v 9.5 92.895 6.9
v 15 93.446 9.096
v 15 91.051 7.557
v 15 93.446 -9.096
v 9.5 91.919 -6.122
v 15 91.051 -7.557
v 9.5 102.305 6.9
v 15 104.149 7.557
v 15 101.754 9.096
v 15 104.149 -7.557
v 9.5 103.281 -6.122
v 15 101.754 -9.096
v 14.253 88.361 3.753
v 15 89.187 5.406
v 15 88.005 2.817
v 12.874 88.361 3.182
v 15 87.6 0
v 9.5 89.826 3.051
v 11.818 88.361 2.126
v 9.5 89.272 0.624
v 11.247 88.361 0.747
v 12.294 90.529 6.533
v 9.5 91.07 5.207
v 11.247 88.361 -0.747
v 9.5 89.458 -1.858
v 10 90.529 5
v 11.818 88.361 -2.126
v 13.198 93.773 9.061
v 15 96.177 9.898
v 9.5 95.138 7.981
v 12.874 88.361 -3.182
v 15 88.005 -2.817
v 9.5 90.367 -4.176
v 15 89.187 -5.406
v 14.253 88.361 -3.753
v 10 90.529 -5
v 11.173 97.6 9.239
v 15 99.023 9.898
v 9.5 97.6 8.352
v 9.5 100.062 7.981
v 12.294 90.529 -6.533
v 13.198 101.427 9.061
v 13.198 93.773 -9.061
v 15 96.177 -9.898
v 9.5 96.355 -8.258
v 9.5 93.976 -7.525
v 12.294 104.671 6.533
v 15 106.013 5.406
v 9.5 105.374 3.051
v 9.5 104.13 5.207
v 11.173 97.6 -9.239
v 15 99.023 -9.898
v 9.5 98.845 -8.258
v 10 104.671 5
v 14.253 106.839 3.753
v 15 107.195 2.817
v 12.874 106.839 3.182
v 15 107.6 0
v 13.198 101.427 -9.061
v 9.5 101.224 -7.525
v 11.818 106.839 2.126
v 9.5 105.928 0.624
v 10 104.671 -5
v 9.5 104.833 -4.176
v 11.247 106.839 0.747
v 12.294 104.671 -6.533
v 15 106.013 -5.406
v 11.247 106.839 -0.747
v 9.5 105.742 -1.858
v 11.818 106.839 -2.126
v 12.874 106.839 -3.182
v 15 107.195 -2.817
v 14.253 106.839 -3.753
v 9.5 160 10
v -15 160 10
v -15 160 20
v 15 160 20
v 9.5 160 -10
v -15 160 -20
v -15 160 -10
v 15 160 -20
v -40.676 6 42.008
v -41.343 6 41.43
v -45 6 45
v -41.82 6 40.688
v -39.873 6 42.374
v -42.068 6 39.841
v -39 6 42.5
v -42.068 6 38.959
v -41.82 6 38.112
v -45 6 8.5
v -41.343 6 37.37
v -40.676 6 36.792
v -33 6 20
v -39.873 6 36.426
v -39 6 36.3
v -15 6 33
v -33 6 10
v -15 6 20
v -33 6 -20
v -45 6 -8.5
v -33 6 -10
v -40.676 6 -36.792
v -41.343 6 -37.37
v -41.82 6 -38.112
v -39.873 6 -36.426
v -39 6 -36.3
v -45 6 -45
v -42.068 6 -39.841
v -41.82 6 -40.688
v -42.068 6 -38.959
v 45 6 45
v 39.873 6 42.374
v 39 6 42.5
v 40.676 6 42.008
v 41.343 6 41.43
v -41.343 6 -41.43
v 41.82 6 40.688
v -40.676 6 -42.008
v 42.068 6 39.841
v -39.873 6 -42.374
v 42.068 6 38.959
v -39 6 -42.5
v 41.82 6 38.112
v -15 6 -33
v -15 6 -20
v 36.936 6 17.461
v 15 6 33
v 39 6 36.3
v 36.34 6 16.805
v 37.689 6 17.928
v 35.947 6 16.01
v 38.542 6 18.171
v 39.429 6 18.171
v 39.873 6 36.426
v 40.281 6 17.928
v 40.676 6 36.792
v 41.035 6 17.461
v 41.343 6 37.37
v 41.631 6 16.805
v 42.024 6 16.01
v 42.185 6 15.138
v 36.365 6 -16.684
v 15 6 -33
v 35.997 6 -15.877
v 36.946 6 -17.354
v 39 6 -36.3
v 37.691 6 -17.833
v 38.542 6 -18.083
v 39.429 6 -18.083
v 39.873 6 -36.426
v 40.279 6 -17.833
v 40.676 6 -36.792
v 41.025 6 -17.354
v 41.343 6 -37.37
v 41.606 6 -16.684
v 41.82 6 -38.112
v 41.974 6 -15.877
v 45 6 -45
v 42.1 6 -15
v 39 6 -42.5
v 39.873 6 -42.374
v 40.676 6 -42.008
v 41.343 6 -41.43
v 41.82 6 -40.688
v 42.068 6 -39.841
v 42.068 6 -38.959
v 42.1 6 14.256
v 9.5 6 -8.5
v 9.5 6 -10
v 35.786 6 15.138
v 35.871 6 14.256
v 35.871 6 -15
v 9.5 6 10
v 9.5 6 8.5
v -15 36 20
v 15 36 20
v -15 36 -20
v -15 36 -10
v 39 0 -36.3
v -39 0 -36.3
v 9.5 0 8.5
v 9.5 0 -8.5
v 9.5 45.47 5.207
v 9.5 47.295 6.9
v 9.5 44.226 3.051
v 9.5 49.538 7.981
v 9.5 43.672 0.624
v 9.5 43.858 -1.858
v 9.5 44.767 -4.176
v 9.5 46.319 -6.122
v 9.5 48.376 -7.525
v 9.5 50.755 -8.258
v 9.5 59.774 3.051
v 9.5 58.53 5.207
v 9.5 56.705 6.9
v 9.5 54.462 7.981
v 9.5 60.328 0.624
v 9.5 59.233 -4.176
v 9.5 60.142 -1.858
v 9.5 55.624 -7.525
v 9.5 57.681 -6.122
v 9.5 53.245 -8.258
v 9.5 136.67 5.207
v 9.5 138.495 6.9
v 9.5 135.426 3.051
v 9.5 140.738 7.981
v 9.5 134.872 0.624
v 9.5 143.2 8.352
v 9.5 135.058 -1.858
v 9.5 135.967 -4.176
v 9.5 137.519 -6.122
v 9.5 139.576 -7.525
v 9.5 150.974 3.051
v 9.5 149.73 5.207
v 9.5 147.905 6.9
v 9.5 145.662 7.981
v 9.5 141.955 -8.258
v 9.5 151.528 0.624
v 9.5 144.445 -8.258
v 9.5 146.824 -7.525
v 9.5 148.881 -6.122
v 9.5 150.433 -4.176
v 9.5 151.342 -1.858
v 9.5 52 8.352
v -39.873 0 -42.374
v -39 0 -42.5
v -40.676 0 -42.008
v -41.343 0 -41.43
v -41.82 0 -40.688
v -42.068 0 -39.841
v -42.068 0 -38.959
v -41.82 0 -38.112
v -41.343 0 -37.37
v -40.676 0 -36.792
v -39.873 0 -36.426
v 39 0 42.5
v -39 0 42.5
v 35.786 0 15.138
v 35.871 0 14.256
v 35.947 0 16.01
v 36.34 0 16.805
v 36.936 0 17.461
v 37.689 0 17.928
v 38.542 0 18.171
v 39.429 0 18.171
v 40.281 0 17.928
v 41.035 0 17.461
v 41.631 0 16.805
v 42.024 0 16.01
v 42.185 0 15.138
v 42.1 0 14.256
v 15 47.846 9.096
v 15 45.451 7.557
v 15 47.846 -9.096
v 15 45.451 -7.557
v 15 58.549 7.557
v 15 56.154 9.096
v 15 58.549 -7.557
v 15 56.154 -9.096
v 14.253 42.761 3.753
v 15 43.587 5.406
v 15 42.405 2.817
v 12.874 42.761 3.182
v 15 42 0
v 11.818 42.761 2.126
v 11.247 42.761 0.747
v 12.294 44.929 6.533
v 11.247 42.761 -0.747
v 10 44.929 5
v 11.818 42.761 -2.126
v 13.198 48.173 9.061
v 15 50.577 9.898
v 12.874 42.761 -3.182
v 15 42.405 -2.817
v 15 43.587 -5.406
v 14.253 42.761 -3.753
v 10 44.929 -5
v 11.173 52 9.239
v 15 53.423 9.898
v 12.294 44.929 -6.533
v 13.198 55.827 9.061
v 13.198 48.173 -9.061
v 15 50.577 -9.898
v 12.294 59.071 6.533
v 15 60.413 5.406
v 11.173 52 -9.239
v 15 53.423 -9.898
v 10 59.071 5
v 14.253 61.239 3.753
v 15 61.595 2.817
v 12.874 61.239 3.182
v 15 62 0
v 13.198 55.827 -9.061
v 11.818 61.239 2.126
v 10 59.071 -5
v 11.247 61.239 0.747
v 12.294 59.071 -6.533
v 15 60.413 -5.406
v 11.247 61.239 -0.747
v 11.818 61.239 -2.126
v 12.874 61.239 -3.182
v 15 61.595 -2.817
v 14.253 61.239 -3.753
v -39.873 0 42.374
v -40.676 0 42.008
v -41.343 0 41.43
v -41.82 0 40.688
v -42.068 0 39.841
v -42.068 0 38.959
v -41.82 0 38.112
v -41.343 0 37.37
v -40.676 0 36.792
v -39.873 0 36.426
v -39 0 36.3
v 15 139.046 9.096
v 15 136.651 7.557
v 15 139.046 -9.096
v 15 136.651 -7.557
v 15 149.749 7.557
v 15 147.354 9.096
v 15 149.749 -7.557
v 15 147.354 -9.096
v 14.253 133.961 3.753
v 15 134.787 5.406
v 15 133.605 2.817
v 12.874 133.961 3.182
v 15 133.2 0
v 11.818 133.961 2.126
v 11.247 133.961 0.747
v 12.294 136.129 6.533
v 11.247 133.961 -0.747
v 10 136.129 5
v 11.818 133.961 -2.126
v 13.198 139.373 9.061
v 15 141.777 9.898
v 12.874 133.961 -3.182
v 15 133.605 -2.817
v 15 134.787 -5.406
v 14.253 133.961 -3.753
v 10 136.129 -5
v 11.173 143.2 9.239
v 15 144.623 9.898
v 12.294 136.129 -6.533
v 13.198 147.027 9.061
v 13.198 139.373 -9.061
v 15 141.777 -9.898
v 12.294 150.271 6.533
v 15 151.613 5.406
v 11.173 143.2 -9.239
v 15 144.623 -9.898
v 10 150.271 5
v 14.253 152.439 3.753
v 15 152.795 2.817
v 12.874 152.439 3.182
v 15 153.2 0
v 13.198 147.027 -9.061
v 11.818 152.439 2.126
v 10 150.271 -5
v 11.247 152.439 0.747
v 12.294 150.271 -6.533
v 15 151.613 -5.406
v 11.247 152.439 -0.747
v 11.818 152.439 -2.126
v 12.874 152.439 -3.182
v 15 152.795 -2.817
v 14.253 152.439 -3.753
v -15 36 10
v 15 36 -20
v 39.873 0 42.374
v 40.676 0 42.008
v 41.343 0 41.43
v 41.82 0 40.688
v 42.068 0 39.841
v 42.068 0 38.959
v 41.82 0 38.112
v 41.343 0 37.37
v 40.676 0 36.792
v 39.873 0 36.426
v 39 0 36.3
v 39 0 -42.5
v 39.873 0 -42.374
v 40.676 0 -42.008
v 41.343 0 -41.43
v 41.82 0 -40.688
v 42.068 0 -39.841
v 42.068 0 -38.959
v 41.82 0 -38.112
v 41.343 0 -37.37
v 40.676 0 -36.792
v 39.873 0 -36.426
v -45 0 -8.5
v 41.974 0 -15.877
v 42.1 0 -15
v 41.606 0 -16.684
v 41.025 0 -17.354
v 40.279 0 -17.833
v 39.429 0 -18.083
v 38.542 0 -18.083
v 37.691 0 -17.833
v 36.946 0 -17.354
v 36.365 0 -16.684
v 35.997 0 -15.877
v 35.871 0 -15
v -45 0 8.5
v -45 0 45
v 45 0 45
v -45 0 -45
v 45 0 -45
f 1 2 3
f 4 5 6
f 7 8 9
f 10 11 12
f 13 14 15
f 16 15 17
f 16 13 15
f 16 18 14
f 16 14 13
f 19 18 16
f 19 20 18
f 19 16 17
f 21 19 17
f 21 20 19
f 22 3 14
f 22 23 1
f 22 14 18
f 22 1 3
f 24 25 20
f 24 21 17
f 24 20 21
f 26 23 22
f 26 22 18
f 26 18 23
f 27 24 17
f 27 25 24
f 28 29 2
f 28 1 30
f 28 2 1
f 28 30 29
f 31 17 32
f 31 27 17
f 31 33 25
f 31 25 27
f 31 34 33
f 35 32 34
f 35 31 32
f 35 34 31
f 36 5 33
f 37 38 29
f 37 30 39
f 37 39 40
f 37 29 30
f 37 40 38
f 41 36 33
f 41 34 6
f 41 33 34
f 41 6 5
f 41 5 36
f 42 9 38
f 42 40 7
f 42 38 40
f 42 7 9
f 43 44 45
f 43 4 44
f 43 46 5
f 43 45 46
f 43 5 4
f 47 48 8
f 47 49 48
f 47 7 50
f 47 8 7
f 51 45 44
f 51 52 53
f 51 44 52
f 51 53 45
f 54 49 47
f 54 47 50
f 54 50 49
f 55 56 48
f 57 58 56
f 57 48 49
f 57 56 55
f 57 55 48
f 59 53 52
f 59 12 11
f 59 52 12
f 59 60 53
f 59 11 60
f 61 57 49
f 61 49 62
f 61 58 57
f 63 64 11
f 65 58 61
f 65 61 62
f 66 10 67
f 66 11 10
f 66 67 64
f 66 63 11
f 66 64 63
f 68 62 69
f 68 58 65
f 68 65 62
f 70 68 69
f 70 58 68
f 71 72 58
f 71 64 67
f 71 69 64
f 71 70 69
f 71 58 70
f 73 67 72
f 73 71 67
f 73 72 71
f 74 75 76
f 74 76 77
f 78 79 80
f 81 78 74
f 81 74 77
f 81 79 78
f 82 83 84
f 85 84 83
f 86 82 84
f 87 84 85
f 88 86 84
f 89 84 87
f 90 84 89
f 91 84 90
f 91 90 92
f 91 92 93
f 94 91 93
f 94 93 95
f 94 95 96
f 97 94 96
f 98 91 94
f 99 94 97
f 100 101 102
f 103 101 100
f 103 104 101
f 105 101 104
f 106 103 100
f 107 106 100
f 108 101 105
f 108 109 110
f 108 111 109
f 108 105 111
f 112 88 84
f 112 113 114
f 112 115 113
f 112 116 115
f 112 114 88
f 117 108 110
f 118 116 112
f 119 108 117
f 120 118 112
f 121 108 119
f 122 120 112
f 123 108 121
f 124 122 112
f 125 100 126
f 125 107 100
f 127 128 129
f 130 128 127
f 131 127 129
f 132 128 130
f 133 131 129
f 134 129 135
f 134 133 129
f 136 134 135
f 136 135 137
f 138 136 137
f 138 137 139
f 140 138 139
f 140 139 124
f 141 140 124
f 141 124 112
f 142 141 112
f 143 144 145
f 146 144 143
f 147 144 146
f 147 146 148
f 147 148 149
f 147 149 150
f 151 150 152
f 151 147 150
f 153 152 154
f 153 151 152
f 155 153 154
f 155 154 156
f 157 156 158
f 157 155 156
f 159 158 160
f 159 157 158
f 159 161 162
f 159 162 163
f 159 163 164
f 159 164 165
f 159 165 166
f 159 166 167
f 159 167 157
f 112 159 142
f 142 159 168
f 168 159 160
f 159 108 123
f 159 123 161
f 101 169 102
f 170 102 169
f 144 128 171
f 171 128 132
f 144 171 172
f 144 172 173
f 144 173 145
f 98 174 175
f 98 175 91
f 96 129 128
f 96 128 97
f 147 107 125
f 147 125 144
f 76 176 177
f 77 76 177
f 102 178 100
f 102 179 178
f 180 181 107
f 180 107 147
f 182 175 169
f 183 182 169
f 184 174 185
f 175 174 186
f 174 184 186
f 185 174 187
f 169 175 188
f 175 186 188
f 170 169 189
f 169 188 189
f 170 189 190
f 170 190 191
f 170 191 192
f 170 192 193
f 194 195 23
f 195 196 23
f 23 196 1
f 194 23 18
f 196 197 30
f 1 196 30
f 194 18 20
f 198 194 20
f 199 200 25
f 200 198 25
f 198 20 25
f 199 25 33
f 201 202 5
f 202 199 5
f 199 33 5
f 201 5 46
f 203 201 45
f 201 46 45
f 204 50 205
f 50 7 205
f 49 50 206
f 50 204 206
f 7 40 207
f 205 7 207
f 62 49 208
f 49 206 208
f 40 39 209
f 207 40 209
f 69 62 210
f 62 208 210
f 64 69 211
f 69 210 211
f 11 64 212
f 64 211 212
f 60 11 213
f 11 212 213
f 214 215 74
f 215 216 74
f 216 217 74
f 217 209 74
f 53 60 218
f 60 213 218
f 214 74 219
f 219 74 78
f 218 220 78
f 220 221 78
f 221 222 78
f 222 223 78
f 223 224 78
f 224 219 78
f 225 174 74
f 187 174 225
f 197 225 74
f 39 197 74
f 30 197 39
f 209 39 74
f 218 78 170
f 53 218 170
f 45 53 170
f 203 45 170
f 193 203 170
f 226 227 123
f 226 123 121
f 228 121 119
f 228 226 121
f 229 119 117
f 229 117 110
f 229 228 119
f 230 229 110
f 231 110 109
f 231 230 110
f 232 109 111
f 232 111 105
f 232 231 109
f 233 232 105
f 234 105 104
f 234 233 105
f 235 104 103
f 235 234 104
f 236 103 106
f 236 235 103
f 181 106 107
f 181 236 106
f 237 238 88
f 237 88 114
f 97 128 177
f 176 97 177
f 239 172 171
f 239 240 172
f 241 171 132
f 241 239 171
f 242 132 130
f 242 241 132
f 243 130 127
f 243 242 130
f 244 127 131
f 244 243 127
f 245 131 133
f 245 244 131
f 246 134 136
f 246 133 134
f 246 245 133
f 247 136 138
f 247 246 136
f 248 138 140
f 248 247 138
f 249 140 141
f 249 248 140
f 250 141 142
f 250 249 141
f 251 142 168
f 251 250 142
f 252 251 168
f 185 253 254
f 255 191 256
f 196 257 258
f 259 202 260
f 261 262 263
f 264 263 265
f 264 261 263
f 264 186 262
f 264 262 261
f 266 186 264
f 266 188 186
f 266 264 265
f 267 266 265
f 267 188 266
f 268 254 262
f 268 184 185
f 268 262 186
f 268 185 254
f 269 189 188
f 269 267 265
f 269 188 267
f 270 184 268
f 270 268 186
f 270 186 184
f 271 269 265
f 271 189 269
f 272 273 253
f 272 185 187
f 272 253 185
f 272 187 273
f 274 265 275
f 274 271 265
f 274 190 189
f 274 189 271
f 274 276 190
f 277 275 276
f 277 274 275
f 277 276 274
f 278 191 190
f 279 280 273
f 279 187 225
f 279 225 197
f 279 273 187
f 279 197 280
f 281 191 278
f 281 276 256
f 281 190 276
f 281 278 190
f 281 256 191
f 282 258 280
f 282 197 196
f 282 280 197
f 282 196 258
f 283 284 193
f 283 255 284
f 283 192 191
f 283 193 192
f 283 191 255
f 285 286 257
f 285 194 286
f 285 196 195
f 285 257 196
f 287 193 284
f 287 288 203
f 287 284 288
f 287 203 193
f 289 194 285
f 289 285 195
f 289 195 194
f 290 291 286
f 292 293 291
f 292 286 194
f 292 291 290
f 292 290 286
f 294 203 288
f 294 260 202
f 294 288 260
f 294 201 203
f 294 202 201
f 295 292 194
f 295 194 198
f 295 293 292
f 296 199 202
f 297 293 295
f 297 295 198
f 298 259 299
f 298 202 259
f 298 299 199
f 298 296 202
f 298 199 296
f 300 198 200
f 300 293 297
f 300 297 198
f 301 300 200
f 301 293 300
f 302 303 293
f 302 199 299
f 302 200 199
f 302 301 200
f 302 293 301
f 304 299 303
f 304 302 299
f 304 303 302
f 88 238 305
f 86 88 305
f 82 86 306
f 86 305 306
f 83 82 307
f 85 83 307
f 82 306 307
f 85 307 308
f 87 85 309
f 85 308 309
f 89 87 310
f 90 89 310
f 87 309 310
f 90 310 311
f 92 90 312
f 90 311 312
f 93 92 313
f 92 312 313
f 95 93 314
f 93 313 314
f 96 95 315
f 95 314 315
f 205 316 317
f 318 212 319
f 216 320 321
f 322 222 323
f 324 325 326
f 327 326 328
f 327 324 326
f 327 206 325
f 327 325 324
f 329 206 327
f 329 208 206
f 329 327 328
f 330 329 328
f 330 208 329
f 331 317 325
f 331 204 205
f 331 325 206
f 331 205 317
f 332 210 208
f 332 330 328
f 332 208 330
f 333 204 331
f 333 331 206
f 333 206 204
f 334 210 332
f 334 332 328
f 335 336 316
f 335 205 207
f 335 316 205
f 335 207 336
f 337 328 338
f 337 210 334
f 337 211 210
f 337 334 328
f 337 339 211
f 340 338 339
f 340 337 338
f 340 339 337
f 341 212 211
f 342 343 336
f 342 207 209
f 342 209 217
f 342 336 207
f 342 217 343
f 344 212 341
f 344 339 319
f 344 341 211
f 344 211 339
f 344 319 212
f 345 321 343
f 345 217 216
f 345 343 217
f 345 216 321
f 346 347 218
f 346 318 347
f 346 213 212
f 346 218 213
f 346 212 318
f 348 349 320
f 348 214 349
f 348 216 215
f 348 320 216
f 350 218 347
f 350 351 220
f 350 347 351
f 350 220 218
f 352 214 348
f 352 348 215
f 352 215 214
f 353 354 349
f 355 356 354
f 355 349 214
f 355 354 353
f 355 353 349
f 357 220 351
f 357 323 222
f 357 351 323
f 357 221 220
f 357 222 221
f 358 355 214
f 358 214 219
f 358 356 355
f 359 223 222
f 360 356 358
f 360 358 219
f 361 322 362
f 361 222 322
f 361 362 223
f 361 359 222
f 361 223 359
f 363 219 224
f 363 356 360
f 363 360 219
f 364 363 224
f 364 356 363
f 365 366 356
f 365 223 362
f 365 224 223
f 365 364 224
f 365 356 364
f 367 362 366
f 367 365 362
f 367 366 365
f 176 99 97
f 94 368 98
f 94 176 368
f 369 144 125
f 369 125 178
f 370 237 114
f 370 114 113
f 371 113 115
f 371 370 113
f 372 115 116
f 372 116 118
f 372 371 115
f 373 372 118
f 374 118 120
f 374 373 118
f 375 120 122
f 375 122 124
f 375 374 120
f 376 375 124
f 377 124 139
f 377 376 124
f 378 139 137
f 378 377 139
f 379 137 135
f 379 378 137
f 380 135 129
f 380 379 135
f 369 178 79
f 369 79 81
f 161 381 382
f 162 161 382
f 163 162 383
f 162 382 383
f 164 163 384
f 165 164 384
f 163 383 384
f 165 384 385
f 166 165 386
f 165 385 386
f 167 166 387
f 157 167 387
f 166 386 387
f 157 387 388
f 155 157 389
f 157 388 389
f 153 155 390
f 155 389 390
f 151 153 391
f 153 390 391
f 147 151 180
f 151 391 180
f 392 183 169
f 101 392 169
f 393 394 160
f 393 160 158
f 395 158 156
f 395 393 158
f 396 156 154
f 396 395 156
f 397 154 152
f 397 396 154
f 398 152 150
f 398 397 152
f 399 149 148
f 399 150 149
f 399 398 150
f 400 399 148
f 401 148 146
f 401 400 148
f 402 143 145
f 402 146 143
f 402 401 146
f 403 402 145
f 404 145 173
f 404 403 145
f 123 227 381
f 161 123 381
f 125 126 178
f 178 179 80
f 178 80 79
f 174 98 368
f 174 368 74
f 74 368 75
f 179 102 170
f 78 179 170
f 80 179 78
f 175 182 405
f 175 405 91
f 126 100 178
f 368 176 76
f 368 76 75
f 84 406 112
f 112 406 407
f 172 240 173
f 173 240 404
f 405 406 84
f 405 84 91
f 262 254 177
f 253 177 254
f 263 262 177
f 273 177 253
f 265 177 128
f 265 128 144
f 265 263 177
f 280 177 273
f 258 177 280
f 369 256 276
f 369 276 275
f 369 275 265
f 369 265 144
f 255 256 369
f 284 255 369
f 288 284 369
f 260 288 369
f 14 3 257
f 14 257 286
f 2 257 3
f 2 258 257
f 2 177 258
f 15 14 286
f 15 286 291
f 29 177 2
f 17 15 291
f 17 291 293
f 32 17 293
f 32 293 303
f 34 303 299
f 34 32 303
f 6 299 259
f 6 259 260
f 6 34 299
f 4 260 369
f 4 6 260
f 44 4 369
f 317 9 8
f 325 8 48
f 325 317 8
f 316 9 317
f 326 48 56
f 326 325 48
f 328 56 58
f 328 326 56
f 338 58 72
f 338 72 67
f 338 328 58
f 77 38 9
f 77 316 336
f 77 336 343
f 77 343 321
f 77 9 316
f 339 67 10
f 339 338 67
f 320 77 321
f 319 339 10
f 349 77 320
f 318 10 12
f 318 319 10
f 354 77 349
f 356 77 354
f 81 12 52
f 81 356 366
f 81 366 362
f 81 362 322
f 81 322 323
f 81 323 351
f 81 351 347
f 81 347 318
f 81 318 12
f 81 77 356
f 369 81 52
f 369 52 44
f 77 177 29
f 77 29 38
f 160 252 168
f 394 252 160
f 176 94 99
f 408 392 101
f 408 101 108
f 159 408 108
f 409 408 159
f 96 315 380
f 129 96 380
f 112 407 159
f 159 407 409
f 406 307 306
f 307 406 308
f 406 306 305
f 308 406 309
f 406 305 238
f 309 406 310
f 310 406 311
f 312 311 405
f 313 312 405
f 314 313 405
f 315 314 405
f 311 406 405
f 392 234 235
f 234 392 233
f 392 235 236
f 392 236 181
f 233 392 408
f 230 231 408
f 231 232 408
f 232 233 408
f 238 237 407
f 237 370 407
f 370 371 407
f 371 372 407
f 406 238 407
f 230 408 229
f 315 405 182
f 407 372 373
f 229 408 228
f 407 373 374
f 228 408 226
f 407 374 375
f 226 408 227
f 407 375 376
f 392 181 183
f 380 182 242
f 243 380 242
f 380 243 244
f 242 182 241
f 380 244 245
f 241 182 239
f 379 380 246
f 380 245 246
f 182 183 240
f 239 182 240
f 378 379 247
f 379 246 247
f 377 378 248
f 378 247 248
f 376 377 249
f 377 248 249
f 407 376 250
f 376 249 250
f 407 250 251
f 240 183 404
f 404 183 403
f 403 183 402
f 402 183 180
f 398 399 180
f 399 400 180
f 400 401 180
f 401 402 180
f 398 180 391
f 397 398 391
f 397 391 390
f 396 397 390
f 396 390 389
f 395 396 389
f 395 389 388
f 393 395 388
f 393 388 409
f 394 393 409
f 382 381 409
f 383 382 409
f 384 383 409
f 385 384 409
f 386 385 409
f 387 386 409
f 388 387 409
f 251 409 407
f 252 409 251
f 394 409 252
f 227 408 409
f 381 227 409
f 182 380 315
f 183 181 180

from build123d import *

# Parameters (mm, degrees)
SKETCH_1_W                  = 90
SKETCH_1_H                  = 90
EXTRUDE_1_DEPTH             = 6
SKETCH_2_W                  = 30
SKETCH_2_H                  = 40
EXTRUDE_2_DEPTH             = 160
EXTRUDE_3_REACH             = 174.192
EXTRUDE_3_DIRECTION_2_REACH = 174.192
SKETCH_8_R                  = 3.1
CUT_EXTRUDE_2_DEPTH         = 6
PATTERN_LINEAR_1_COUNT      = 3
PATTERN_LINEAR_1_PITCH      = 45.6
EXTRUDE_4_DEPTH             = 15
CUT_EXTRUDE_4_DEPTH         = 9.5
CUT_EXTRUDE_4_DEPTH_BACK    = 173.191753577
SKETCH_17_W                 = 20
SKETCH_17_H                 = 154
CUT_EXTRUDE_8_DEPTH         = 9.5
CUT_EXTRUDE_8_DEPTH_BACK    = 173.191753577
SKETCH_21_W                 = 17
SKETCH_21_H                 = 6
SKETCH_23_W                 = 78
SKETCH_23_H                 = 6.2
CUT_EXTRUDE_9_DEPTH         = 173.191753577
MIRROR_14_COPY_1_SKETCH_R   = 3.1
MIRROR_14_COPY_1_DEPTH      = 6
SKETCH_25_W                 = 6.229282002
SKETCH_25_H                 = 30
CUT_EXTRUDE_10_DEPTH        = 173.191753577
SKETCH_26_R                 = 3.114641001
CUT_EXTRUDE_11_DEPTH        = 173.191753577
SKETCH_27_R                 = 3.202321727
CUT_EXTRUDE_12_DEPTH        = 173.191753577


with BuildPart() as part:
    # 草图1 → 凸台-拉伸1 (new body)
    with BuildSketch(Plane(origin=(0, 0, 0), x_dir=(1, 0, 0), z_dir=(0, 1, 0))):
        Rectangle(SKETCH_1_W, SKETCH_1_H)
    extrude(amount=EXTRUDE_1_DEPTH)

    # 草图2 → 凸台-拉伸2 (add)
    with BuildSketch(Plane(origin=(0, 0, 0), x_dir=(1, 0, 0), z_dir=(0, 1, 0))):
        Rectangle(SKETCH_2_W, SKETCH_2_H)
    extrude(amount=EXTRUDE_2_DEPTH)

    # 凸台-拉伸3: up to this face of the body (flat: up to its plane)
    extrude_3_end = Plane(part.part.faces().sort_by_distance((0, 83, 20))[0])
    # 草图7 → 凸台-拉伸3 (add, up to the picked face)
    with BuildSketch(Plane.XY, mode=Mode.PRIVATE) as extrude_3_sk1:
        Polygon((-15, 36), (-33, 6), (-15, 6), align=None)
    extrude_3_tool1 = split(extrude(extrude_3_sk1.sketch, amount=EXTRUDE_3_REACH, mode=Mode.PRIVATE), bisect_by=extrude_3_end, keep=Keep.BOTH, mode=Mode.PRIVATE)
    add(extrude_3_tool1.solids().sort_by(Axis((-21, 16, 0), (0, 0, 1)))[0])

    # 凸台-拉伸3 direction 2: up to this face of the body (flat: up to its plane)
    extrude_3_direction_2_end = Plane(part.part.faces().sort_by_distance((0, 83, -20))[0])
    # 草图7 → 凸台-拉伸3 direction 2 (add, up to the picked face)
    with BuildSketch(Plane.XY, mode=Mode.PRIVATE) as extrude_3_direction_2_sk1:
        Polygon((-15, 36), (-33, 6), (-15, 6), align=None)
    extrude_3_direction_2_tool1 = split(extrude(extrude_3_direction_2_sk1.sketch, amount=-EXTRUDE_3_DIRECTION_2_REACH, mode=Mode.PRIVATE), bisect_by=extrude_3_direction_2_end, keep=Keep.BOTH, mode=Mode.PRIVATE)
    add(extrude_3_direction_2_tool1.solids().sort_by(Axis((-21, 16, 0), (0, 0, -1)))[0])

    # 草图8 → 切除-拉伸2 (cut)
    with BuildSketch(Plane(origin=(0, 0, 0), x_dir=(1, 0, 0), z_dir=(0, 1, 0))):
        with Locations(Location((-39, 39.4, 0), (0, 0, 270))):
            Circle(SKETCH_8_R)
    cut_extrude_2 = extrude(amount=CUT_EXTRUDE_2_DEPTH, mode=Mode.SUBTRACT)

    # 草图12 → 切除-旋转2 (revolve, cut)
    with BuildSketch(Plane.XY):
        with BuildLine():
            Line((15, 62), (15, 42))
            ThreePointArc((15, 42), (5, 52), (15, 62))
        make_face()
    cut_revolve_2 = revolve(axis=Axis((15, 62, 0), (0, -1, 0)), mode=Mode.SUBTRACT)

    # 阵列(线性)1: 切除-旋转2 ×3
    with Locations(*[(0, i * PATTERN_LINEAR_1_PITCH, 0) for i in range(1, PATTERN_LINEAR_1_COUNT)]):
        add(cut_revolve_2, mode=Mode.SUBTRACT)

    # 草图15 → 凸台-拉伸4 (add, symmetric)
    with BuildSketch(Plane(origin=(0, 0, 0), x_dir=(0, 0, -1), z_dir=(1, 0, 0))):
        Polygon((-20, 36), (-20, 6), (-33, 6), align=None)
    extrude_4 = extrude(amount=EXTRUDE_4_DEPTH, both=True)

    # 镜向11: 凸台-拉伸4 across plane
    add(extrude_4.mirror(Plane.XY))

    # 草图17 → 切除-拉伸4 (cut, two sides: drawn at the far end of the back side and taken through both)
    with BuildSketch(Plane(origin=(0, 0, 0), x_dir=(0, 0, -1), z_dir=(1, 0, 0)).offset(-CUT_EXTRUDE_4_DEPTH_BACK)):
        with Locations((0, 83)):
            Rectangle(SKETCH_17_W, SKETCH_17_H)
    extrude(amount=CUT_EXTRUDE_4_DEPTH + CUT_EXTRUDE_4_DEPTH_BACK, mode=Mode.SUBTRACT)

    # 草图21 → 切除-拉伸8 (cut, two sides: drawn at the far end of the back side and taken through both)
    with BuildSketch(Plane(origin=(0, 0, 0), x_dir=(0, 0, -1), z_dir=(1, 0, 0)).offset(-CUT_EXTRUDE_8_DEPTH_BACK)):
        with Locations((0, 3)):
            Rectangle(SKETCH_21_W, SKETCH_21_H)
    extrude(amount=CUT_EXTRUDE_8_DEPTH + CUT_EXTRUDE_8_DEPTH_BACK, mode=Mode.SUBTRACT)

    # 镜向12: 切除-拉伸2 across plane
    add(cut_extrude_2.mirror(Plane(origin=(0, 0, 0), x_dir=(0, 0, 1), z_dir=(1, 0, 0))), mode=Mode.SUBTRACT)

    # 草图23 → 切除-拉伸9 (cut, through all)
    with BuildSketch(Plane(origin=(0, 0, 0), x_dir=(1, 0, 0), z_dir=(0, 1, 0))):
        with Locations((0, 39.4)):
            Rectangle(SKETCH_23_W, SKETCH_23_H)
    cut_extrude_9 = extrude(amount=CUT_EXTRUDE_9_DEPTH, mode=Mode.SUBTRACT)

    # 镜向13: 切除-拉伸9 across plane
    add(cut_extrude_9.mirror(Plane.XY), mode=Mode.SUBTRACT)

    # 镜向14: 切除-拉伸2 across plane
    add(cut_extrude_2.mirror(Plane.XY), mode=Mode.SUBTRACT)

    # 镜向14 copy 1 sketch → 镜向14 copy 1 (cut)
    with BuildSketch(Plane(origin=(0, 0, 0), x_dir=(-1, 0, 0), z_dir=(0, 1, 0))):
        with Locations(Location((-39, 39.4, 0), (0, 0, 270))):
            Circle(MIRROR_14_COPY_1_SKETCH_R)
    extrude(amount=MIRROR_14_COPY_1_DEPTH, mode=Mode.SUBTRACT)

    # 草图25 → 切除-拉伸10 (cut, through all)
    with BuildSketch(Plane(origin=(0, 0, 0), x_dir=(1, 0, 0), z_dir=(0, 1, 0))):
        with Locations((38.985358999, 0)):
            Rectangle(SKETCH_25_W, SKETCH_25_H)
    extrude(amount=CUT_EXTRUDE_10_DEPTH, mode=Mode.SUBTRACT)

    # 草图26 → 切除-拉伸11 (cut, through all)
    with BuildSketch(Plane(origin=(0, 0, 0), x_dir=(1, 0, 0), z_dir=(0, 1, 0))):
        with Locations((38.985358999, 15)):
            Circle(SKETCH_26_R)
    extrude(amount=CUT_EXTRUDE_11_DEPTH, mode=Mode.SUBTRACT)

    # 草图27 → 切除-拉伸12 (cut, through all)
    with BuildSketch(Plane(origin=(0, 0, 0), x_dir=(1, 0, 0), z_dir=(0, 1, 0))):
        with Locations((38.985358999, -15)):
            Circle(SKETCH_27_R)
    extrude(amount=CUT_EXTRUDE_12_DEPTH, mode=Mode.SUBTRACT)


solid = part.part
